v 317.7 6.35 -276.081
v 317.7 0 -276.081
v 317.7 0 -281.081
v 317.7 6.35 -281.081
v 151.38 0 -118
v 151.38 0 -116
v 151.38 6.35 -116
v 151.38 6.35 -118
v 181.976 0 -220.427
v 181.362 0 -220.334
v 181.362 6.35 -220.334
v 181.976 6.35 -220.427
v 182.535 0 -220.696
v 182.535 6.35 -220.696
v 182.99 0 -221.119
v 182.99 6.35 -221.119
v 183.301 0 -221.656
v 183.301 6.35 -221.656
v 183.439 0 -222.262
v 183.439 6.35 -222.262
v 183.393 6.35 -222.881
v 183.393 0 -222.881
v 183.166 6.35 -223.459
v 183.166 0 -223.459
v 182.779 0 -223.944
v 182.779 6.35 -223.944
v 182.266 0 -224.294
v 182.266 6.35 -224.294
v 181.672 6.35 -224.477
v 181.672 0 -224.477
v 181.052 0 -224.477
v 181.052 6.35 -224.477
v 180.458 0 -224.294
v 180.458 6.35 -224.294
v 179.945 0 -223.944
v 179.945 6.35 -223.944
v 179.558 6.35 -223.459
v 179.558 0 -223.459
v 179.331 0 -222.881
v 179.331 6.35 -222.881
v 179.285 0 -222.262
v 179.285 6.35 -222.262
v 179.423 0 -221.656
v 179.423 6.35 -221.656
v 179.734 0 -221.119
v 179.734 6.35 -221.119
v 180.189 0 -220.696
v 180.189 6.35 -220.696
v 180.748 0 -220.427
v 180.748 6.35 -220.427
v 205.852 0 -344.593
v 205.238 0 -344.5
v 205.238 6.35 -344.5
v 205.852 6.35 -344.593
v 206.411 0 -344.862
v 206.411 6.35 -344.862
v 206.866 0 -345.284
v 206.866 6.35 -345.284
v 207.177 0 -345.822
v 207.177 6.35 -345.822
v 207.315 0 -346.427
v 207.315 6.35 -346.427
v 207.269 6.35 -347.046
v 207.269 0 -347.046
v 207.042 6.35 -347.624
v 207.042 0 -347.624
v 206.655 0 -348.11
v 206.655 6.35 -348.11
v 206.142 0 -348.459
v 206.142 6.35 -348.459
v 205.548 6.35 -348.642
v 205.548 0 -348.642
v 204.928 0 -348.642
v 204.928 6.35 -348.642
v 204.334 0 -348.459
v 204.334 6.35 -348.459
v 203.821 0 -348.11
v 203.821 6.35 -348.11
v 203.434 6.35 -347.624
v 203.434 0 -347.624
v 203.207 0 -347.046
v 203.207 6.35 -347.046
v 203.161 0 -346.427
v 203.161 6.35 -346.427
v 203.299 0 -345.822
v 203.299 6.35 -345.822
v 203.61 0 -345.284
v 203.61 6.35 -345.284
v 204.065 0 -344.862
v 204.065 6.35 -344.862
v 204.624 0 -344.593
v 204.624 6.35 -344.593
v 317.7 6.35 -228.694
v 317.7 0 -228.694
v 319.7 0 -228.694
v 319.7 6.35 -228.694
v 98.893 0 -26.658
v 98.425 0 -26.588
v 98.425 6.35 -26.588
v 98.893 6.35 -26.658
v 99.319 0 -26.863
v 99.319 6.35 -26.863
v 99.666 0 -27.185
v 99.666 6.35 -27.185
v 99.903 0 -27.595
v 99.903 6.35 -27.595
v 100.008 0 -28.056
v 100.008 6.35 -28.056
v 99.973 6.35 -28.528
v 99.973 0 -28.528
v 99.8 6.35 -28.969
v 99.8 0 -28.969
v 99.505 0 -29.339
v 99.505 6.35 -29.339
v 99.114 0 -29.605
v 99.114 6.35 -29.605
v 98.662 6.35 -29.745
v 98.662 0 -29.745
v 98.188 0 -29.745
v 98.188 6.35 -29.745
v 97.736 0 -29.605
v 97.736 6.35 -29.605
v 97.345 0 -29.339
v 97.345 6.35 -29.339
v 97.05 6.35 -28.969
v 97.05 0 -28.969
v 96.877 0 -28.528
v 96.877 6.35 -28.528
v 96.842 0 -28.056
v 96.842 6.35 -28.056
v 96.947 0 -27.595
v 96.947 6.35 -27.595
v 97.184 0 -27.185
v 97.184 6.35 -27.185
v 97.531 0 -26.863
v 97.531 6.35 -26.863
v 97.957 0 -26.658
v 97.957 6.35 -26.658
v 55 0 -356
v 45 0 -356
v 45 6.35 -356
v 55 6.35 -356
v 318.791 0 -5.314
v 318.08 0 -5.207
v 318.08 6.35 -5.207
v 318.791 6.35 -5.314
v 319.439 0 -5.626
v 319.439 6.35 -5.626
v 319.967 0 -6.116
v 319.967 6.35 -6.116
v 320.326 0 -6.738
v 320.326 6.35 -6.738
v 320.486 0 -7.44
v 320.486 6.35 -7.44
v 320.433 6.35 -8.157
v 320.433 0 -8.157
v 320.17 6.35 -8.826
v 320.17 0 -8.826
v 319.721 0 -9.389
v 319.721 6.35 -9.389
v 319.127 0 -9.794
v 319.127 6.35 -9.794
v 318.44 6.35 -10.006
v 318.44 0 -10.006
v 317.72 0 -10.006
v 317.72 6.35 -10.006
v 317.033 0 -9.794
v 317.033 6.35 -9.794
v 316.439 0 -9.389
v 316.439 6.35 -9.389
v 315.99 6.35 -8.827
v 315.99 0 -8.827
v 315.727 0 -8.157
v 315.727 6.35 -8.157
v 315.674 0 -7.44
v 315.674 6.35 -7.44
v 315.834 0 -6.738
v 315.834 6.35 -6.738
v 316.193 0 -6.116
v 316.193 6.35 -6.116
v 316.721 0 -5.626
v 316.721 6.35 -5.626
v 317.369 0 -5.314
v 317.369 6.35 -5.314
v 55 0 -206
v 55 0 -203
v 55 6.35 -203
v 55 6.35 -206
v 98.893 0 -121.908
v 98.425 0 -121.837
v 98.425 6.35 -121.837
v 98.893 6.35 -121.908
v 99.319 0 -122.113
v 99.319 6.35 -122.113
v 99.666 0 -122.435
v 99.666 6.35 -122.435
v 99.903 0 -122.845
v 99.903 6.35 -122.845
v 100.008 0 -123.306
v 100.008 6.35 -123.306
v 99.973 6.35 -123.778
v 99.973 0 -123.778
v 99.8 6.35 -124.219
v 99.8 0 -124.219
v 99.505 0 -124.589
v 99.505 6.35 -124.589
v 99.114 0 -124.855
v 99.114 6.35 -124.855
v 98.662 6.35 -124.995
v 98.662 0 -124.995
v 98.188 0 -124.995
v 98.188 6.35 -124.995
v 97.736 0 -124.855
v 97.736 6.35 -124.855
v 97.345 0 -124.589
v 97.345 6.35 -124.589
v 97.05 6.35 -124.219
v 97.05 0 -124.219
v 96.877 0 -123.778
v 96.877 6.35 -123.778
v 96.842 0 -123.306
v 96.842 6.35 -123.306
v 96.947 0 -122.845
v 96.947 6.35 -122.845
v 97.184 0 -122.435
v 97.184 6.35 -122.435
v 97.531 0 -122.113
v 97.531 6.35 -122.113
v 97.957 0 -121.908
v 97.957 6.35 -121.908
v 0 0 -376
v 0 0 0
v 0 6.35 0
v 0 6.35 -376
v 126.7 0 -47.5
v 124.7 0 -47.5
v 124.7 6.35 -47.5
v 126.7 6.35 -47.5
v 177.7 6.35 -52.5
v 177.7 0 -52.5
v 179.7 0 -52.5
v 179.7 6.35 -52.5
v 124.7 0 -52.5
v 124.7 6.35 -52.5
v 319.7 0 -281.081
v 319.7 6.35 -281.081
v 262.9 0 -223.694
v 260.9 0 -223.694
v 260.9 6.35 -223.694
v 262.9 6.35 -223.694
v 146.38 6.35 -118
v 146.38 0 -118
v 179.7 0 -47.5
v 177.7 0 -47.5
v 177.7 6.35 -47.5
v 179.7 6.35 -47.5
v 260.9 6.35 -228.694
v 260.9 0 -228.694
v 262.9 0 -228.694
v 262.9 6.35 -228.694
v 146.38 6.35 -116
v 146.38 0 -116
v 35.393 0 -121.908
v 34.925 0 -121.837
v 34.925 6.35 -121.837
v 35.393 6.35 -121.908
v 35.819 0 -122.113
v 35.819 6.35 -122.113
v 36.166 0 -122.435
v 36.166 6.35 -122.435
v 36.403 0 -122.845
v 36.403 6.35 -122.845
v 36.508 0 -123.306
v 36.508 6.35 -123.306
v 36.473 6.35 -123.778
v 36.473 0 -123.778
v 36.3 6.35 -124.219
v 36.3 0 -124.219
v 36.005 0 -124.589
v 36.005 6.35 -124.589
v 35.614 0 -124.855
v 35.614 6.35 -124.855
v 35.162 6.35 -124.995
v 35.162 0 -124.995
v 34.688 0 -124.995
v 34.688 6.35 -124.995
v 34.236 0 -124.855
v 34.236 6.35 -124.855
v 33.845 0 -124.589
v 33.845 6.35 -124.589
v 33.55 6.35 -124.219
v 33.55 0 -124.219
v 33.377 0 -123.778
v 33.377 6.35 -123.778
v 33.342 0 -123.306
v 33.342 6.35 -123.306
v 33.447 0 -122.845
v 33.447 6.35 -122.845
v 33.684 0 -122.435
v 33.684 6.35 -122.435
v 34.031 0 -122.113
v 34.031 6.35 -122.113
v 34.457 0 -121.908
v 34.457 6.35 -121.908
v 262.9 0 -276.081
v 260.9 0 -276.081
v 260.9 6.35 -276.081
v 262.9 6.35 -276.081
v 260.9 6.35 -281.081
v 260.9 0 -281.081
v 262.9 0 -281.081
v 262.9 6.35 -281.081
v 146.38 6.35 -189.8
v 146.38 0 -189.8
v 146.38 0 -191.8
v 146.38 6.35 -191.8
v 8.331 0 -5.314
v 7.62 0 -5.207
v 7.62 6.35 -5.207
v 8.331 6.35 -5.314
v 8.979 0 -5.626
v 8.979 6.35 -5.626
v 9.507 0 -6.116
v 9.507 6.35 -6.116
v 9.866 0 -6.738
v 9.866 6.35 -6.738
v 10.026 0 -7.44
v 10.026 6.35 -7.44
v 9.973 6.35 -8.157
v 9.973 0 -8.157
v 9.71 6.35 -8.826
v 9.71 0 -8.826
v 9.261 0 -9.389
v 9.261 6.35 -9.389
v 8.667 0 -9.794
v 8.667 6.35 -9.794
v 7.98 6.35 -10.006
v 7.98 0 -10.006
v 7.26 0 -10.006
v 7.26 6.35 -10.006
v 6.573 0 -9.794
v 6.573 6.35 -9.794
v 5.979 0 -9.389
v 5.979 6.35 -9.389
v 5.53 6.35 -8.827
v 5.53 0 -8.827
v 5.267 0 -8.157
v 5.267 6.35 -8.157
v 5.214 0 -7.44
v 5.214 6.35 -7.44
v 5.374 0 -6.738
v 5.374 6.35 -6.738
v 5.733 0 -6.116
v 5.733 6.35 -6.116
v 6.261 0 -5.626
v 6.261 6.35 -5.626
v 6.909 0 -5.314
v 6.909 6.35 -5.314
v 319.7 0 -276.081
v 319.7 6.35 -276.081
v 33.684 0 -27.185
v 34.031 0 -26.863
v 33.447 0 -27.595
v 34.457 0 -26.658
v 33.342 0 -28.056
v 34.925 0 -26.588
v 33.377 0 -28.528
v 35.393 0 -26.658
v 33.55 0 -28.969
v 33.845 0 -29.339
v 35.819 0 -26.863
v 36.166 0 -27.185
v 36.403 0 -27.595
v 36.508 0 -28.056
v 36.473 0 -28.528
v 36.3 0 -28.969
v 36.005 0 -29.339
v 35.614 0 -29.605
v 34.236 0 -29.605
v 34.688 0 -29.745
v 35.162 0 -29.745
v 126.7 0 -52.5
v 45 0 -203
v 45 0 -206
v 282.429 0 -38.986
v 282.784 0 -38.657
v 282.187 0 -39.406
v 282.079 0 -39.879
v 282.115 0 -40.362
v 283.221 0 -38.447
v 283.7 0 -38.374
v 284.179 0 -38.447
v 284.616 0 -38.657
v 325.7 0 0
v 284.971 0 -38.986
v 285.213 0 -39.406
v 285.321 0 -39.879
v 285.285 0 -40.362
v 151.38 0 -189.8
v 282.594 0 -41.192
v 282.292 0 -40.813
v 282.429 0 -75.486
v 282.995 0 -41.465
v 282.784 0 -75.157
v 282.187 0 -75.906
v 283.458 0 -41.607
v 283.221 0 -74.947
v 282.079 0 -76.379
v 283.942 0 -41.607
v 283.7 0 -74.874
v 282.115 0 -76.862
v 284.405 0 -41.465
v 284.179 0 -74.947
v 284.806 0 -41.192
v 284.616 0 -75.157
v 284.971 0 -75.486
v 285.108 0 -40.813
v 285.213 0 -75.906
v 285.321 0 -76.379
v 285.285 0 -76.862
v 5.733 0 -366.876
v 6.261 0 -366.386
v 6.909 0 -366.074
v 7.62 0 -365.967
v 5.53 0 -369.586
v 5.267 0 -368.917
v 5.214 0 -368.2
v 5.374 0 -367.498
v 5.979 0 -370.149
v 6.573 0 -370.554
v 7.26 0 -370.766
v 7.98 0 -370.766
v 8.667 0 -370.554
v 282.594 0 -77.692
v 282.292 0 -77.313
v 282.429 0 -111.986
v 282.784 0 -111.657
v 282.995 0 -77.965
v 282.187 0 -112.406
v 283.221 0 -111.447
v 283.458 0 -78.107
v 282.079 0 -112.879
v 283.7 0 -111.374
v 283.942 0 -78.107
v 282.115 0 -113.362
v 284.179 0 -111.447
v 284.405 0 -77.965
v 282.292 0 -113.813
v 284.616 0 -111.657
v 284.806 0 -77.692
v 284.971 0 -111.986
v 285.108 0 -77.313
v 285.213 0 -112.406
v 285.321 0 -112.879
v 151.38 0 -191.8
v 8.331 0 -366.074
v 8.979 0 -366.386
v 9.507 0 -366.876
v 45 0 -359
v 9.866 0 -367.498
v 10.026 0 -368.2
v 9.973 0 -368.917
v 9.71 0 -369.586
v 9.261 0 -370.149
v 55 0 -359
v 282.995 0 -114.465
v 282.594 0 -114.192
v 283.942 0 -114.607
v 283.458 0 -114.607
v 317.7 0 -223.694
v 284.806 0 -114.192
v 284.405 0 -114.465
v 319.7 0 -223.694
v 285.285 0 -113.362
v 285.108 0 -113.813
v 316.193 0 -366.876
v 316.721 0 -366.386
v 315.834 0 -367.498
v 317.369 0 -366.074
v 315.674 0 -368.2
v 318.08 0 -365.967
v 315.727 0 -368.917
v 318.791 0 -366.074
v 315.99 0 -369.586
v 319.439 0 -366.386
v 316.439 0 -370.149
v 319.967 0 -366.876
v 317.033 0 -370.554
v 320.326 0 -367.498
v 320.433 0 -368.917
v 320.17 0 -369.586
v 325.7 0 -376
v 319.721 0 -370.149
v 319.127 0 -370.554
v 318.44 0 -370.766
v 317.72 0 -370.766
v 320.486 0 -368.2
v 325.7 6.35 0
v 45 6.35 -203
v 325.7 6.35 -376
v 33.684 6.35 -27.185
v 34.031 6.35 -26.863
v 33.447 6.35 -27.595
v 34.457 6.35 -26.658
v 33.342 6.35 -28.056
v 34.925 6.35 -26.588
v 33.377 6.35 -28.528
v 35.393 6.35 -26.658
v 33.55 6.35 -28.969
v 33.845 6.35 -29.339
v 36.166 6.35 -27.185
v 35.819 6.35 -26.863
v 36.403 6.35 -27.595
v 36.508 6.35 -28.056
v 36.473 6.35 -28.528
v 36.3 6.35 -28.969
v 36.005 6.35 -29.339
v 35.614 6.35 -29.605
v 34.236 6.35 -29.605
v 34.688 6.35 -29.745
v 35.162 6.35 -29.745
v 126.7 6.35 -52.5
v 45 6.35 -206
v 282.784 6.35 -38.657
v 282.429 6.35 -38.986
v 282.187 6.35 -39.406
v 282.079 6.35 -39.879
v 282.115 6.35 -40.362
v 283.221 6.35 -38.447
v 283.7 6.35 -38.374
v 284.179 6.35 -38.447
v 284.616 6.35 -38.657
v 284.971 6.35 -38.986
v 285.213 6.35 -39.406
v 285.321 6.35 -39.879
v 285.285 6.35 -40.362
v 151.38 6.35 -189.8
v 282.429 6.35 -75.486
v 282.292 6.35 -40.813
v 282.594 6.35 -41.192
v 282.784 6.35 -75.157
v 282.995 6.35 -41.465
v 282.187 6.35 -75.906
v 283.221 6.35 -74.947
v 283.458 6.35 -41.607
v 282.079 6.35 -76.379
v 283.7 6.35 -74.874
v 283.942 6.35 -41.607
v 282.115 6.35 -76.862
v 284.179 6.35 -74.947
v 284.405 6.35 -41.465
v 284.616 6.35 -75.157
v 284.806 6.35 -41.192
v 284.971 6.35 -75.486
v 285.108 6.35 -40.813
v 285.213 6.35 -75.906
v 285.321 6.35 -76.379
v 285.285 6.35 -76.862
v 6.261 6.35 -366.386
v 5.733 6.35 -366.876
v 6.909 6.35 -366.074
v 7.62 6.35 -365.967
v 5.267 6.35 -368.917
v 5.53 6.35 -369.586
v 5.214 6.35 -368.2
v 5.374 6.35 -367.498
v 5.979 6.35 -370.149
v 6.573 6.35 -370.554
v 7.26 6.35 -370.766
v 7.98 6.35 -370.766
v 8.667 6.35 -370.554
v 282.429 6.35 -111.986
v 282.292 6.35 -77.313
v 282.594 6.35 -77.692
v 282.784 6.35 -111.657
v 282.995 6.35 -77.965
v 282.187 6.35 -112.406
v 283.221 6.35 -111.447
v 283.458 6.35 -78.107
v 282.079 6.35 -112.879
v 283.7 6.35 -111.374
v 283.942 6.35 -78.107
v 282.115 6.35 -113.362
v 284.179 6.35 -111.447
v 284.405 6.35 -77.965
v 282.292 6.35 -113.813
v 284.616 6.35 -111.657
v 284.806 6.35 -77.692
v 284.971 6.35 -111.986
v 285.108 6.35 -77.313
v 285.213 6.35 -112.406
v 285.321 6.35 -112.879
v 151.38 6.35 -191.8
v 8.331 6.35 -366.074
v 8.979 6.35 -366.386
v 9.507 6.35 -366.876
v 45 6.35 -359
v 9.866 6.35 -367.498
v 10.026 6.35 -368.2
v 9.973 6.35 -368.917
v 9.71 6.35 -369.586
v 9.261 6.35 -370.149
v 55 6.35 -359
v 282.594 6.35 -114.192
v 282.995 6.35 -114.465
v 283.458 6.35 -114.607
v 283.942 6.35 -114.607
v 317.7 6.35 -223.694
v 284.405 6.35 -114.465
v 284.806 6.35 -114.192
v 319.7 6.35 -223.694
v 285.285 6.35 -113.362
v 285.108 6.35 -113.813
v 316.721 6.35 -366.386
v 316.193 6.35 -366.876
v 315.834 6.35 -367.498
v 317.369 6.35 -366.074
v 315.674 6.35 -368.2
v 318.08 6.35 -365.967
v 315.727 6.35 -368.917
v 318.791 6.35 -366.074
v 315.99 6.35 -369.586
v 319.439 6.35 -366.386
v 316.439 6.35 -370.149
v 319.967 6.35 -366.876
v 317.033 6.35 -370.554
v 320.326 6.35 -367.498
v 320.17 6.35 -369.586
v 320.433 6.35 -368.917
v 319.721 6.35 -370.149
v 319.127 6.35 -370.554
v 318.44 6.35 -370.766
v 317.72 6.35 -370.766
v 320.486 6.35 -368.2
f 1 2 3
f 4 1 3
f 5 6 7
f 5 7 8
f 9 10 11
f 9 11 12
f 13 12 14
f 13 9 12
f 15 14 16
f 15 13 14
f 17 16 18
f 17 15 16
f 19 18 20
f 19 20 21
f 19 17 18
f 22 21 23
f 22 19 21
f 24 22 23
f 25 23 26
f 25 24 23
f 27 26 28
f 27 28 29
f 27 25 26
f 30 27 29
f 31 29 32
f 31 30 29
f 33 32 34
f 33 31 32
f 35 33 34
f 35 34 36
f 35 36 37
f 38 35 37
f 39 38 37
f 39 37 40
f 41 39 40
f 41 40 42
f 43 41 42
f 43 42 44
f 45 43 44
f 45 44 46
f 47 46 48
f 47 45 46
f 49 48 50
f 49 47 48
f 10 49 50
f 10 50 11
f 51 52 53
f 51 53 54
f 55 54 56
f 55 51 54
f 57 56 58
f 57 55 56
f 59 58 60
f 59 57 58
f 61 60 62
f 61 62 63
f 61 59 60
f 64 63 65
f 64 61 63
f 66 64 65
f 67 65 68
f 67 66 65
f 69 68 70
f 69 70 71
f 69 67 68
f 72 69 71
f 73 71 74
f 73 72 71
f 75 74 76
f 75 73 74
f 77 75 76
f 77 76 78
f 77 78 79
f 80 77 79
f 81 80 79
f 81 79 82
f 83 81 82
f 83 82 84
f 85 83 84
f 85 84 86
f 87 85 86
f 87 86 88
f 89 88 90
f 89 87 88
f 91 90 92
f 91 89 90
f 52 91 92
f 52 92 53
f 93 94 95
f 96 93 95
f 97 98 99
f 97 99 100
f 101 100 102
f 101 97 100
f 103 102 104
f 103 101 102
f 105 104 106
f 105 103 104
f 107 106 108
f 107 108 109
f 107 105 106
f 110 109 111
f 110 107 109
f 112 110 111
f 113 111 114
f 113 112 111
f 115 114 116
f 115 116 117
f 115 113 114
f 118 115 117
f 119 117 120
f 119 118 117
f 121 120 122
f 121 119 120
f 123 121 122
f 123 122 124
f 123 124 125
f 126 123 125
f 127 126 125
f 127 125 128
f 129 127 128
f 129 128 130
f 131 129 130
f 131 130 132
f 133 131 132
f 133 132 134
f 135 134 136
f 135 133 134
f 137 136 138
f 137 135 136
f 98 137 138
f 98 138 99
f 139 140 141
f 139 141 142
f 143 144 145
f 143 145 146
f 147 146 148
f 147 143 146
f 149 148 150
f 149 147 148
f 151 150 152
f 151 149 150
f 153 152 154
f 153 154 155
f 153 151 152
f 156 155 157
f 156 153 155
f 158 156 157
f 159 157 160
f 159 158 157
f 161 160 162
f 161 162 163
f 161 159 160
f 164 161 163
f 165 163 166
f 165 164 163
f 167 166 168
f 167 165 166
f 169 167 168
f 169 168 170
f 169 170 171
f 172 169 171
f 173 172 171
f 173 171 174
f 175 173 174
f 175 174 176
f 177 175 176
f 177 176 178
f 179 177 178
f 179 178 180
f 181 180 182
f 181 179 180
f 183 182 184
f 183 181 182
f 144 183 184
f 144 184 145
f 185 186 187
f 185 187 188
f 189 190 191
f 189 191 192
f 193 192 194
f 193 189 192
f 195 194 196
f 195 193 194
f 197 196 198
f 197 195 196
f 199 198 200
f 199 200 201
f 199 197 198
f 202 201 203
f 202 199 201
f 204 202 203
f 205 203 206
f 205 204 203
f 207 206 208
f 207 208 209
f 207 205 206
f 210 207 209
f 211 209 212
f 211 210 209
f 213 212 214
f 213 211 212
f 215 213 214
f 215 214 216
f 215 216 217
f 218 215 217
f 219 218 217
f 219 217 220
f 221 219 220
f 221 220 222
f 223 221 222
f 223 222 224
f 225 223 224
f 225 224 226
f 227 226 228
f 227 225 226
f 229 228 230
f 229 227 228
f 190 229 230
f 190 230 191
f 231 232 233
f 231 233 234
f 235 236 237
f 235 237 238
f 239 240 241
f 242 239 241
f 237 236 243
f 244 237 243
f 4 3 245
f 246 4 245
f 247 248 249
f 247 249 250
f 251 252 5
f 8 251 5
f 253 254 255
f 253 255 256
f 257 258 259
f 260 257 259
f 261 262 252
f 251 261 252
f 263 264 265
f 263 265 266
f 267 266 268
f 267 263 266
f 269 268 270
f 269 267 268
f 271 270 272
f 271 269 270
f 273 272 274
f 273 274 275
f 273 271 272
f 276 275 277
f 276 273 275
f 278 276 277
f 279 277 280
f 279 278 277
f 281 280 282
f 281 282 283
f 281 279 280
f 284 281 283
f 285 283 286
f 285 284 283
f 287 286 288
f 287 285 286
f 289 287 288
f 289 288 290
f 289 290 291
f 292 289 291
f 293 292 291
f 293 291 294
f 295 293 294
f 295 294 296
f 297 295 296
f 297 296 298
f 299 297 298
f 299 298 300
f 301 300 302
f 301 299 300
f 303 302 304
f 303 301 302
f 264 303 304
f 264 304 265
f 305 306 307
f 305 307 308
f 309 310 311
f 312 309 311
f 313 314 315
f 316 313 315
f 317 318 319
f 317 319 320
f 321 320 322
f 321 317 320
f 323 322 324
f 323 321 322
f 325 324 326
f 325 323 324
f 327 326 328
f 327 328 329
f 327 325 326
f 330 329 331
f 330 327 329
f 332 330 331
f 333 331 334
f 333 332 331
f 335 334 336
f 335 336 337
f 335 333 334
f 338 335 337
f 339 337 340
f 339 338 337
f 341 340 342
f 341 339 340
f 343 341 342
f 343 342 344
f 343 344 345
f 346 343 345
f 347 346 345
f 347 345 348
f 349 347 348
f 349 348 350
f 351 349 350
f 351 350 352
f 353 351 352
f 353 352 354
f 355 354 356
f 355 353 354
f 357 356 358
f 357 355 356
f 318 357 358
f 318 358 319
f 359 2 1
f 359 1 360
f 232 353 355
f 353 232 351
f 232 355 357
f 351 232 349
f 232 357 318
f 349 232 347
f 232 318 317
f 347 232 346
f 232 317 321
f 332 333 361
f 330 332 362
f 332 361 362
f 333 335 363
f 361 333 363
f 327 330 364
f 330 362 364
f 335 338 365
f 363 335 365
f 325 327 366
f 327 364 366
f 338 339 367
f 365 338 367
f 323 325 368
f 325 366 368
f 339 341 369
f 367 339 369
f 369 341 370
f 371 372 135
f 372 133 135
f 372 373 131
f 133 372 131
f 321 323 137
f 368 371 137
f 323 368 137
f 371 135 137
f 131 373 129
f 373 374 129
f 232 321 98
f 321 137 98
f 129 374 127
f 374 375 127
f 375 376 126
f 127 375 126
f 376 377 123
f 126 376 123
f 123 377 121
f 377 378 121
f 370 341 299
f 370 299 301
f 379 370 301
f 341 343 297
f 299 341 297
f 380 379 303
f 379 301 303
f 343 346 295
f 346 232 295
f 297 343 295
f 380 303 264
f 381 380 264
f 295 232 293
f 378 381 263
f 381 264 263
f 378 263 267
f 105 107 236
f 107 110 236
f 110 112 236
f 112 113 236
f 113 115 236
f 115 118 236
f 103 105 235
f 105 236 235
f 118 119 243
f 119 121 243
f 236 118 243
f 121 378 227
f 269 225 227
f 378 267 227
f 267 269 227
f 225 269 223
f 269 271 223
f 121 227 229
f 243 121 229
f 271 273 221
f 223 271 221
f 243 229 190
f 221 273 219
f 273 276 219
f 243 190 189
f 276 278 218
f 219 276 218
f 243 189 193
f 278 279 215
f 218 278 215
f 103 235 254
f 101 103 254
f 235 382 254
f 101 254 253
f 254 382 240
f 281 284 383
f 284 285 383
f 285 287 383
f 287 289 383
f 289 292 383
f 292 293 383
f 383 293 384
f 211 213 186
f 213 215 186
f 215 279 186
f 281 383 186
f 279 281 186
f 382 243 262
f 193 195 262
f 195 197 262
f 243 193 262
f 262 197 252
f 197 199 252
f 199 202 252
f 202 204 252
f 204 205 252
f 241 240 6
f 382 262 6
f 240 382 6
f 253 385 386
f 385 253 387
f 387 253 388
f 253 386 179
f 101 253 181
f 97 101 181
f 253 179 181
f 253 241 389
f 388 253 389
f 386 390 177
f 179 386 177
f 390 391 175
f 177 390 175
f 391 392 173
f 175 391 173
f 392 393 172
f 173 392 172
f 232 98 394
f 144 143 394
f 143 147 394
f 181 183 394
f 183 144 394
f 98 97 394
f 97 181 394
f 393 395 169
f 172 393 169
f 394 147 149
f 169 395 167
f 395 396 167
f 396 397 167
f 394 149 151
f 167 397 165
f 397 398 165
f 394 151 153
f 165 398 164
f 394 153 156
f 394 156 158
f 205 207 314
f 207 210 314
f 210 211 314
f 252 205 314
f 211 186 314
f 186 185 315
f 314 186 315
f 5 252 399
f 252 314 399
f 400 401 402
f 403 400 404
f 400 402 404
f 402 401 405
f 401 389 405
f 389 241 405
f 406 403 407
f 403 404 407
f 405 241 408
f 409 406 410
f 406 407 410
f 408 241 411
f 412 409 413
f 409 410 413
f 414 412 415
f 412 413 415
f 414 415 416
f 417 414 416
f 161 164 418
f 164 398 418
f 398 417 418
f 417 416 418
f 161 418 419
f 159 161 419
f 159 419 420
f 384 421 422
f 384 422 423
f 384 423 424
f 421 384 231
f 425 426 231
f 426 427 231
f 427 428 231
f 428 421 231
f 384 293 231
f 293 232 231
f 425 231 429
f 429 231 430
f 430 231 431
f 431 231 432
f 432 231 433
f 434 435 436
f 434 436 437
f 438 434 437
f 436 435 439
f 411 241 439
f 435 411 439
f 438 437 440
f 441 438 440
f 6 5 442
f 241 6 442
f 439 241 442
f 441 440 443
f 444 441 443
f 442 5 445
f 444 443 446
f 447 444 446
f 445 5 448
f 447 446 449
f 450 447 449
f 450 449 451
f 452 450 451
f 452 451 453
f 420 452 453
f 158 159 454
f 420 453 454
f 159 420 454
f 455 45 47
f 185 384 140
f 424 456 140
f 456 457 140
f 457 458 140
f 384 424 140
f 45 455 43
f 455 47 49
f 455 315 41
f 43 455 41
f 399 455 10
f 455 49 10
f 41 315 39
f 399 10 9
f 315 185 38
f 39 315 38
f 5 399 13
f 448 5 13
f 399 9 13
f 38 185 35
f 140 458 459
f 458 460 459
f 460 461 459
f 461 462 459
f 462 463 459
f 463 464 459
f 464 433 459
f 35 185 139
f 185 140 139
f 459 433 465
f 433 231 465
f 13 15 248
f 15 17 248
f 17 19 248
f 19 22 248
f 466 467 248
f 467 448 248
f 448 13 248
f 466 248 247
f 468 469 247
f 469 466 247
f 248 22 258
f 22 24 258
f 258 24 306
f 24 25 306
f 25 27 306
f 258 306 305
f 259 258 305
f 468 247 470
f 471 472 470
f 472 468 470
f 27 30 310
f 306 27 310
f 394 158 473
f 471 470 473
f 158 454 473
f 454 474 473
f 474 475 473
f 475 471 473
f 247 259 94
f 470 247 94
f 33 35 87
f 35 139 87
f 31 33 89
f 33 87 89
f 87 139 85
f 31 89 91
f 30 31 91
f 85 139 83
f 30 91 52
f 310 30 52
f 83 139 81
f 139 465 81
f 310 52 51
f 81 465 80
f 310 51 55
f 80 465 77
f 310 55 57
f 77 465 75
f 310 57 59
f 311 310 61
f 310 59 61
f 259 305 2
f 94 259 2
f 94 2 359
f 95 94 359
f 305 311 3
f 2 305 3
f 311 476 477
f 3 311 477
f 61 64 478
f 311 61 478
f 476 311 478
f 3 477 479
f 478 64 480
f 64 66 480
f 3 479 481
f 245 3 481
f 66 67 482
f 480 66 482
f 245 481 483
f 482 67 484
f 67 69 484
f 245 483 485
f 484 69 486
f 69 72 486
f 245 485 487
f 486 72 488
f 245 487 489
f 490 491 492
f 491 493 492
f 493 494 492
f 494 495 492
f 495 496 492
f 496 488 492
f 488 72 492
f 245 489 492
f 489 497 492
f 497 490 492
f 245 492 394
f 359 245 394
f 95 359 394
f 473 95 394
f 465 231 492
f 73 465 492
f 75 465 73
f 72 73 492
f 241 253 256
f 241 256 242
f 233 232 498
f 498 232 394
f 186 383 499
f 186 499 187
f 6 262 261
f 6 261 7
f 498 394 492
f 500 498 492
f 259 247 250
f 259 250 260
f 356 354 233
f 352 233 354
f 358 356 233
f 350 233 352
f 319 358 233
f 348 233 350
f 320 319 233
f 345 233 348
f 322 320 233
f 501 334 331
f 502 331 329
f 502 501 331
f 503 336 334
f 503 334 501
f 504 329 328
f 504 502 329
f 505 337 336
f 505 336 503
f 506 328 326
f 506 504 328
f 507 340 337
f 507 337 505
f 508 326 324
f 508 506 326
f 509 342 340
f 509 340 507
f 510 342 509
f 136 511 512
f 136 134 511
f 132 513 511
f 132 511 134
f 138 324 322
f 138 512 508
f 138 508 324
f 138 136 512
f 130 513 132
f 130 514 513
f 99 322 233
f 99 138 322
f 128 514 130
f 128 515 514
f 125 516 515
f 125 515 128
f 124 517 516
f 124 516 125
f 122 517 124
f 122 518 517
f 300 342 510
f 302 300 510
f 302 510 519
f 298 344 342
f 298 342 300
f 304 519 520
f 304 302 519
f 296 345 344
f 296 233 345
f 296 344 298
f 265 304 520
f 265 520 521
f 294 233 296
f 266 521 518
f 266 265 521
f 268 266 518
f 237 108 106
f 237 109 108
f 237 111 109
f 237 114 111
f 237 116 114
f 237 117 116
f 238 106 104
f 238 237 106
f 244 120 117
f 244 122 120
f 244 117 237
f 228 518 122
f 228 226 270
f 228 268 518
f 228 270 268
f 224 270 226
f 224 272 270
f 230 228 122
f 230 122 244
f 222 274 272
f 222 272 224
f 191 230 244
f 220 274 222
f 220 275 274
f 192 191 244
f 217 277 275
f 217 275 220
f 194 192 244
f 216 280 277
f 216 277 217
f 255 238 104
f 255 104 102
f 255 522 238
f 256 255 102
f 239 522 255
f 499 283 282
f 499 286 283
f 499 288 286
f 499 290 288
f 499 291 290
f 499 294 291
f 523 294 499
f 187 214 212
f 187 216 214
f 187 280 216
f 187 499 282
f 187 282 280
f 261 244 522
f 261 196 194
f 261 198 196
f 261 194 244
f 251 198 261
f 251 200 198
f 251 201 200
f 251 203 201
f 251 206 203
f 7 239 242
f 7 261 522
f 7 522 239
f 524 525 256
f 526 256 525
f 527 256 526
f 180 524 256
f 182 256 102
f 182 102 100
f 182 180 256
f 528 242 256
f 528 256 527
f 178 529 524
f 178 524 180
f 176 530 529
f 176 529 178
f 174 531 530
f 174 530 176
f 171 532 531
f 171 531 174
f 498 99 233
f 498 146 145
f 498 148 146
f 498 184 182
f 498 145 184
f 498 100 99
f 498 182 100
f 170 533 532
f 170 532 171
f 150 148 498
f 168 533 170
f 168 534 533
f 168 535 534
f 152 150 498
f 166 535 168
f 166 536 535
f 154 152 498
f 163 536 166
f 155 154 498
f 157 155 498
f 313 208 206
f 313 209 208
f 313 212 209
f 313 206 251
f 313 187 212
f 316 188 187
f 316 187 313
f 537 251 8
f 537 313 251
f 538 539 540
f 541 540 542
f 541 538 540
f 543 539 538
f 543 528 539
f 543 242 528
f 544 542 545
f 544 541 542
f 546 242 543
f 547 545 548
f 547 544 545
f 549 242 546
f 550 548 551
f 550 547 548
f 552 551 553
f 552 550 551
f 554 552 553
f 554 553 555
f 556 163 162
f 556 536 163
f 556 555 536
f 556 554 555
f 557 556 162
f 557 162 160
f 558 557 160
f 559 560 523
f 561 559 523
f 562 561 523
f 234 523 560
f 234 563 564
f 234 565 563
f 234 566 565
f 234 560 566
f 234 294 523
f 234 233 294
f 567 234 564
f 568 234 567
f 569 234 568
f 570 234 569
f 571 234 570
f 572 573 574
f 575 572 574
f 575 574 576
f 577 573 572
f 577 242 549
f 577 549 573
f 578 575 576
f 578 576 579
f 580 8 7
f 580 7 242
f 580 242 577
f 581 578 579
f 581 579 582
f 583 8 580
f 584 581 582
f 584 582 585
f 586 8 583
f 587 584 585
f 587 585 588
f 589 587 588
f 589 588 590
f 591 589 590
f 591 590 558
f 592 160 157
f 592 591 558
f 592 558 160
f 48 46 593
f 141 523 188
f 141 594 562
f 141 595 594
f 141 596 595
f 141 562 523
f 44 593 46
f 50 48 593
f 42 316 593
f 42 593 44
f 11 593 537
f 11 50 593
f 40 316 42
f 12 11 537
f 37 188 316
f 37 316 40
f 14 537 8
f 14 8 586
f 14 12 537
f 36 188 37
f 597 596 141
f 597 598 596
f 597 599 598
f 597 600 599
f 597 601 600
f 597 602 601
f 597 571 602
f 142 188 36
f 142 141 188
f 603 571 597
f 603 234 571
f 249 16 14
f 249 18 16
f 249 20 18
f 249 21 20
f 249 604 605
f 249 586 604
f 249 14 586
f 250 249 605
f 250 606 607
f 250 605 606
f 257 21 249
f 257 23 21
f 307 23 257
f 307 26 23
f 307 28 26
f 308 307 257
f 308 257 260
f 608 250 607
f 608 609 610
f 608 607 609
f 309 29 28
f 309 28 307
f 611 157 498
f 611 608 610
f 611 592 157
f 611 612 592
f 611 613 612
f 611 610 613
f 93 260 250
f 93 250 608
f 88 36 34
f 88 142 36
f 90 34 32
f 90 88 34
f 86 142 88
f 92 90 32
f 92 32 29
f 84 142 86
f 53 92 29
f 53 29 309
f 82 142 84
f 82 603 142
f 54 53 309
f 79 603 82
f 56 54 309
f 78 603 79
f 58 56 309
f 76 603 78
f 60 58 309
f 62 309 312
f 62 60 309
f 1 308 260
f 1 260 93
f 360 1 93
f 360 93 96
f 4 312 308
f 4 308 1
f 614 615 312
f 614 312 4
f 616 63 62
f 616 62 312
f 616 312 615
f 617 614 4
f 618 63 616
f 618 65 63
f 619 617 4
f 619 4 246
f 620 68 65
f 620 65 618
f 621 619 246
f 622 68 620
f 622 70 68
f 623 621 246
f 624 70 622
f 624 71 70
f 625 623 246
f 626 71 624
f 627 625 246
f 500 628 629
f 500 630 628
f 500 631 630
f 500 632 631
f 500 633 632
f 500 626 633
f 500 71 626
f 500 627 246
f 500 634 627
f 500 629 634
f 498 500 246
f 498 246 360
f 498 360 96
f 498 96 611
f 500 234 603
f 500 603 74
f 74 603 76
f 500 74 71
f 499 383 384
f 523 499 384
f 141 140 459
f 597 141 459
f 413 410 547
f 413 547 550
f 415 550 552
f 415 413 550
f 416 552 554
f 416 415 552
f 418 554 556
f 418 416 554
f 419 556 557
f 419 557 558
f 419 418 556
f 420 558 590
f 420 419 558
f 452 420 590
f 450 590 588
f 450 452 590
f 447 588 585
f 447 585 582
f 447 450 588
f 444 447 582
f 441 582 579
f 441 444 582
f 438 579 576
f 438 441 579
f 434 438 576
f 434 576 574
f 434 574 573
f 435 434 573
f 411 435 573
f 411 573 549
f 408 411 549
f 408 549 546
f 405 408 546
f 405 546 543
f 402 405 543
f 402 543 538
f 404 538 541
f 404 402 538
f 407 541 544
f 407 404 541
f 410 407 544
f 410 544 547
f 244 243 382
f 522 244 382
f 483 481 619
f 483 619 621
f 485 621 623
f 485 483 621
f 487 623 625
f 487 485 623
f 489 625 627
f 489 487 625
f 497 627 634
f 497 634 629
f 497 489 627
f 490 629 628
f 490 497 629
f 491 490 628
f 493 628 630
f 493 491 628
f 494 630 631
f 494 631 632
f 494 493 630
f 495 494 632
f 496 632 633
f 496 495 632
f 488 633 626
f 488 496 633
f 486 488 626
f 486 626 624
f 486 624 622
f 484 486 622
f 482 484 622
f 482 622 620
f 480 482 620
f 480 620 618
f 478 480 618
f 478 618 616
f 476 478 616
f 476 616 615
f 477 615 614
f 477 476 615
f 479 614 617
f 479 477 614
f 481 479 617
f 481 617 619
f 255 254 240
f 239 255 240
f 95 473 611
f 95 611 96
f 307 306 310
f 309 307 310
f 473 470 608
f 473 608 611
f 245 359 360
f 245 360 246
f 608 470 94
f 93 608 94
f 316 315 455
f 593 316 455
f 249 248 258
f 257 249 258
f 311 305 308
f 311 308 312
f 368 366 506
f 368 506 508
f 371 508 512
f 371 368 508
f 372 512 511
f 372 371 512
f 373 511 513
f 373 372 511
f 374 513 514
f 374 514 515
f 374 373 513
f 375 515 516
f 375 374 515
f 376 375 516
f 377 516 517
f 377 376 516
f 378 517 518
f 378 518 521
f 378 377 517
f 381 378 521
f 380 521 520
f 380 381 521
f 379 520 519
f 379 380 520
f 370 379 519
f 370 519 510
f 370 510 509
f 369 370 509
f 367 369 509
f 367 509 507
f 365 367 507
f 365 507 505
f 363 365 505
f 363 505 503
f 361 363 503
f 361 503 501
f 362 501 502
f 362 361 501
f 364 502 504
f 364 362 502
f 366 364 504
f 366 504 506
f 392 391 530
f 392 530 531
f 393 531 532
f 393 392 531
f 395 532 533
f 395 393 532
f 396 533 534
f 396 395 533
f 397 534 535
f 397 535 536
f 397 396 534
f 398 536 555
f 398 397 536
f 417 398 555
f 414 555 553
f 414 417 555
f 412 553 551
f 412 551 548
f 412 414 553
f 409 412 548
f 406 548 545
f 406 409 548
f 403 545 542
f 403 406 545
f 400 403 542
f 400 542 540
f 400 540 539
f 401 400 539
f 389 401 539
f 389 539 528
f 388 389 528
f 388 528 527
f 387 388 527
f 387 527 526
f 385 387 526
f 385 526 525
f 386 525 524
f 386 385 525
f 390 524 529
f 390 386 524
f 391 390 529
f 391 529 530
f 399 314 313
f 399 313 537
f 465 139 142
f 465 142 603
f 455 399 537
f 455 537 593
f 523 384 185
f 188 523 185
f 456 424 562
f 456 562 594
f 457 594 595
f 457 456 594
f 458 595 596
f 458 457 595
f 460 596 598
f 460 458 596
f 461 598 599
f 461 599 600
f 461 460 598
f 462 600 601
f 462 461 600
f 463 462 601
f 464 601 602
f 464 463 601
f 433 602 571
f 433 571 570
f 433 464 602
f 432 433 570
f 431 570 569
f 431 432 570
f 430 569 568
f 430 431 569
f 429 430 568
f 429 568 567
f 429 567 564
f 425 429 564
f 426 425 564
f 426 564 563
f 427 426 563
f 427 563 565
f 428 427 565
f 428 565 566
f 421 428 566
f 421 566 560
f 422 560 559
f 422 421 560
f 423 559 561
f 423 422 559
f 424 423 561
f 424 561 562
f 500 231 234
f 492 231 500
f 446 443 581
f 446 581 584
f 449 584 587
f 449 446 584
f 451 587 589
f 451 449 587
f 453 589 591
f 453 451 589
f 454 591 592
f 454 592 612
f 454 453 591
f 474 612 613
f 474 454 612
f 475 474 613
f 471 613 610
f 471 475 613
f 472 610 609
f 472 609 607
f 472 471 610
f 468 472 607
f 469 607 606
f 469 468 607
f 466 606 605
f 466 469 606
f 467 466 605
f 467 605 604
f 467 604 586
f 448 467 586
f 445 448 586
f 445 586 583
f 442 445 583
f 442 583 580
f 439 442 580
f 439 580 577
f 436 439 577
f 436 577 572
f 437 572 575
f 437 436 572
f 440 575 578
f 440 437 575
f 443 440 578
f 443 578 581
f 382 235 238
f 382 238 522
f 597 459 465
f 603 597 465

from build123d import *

# Parameters (mm, degrees)
SKETCH1_W      = 325.7
SKETCH1_H      = 376
SKETCH1_R      = 2.413
SKETCH1_R_2    = 2.0828
SKETCH1_R_3    = 1.5875
SKETCH1_R_4    = 1.6256
SKETCH1_W_2    = 10
SKETCH1_H_2    = 3
SKETCH1_W_3    = 5
SKETCH1_H_3    = 2
SKETCH1_W_4    = 2
SKETCH1_H_4    = 5
EXTRUDE1_DEPTH = 6.35


with BuildPart() as part:
    # Sketch1 → Extrude1 (new body)
    with BuildSketch(Plane(origin=(0, 0, 0), x_dir=(1, 0, 0), z_dir=(0, 1, 0))):
        with Locations((162.85, 188)):
            Rectangle(SKETCH1_W, SKETCH1_H)
        with Locations(Location((7.62, 368.38, 0), (0, 0, 270))):
            Circle(SKETCH1_R, mode=Mode.SUBTRACT)
        with Locations(Location((205.238, 346.5828, 0), (0, 0, 270))):
            Circle(SKETCH1_R_2, mode=Mode.SUBTRACT)
        with Locations(Location((181.362, 222.4172, 0), (0, 0, 270))):
            Circle(SKETCH1_R_2, mode=Mode.SUBTRACT)
        with Locations(Location((318.08, 368.38, 0), (0, 0, 270))):
            Circle(SKETCH1_R, mode=Mode.SUBTRACT)
        with Locations(Location((7.62, 7.62, 0), (0, 0, 270))):
            Circle(SKETCH1_R, mode=Mode.SUBTRACT)
        with Locations(Location((318.08, 7.62, 0), (0, 0, 270))):
            Circle(SKETCH1_R, mode=Mode.SUBTRACT)
        with Locations(Location((34.925, 123.425, 0), (0, 0, 270))):
            Circle(SKETCH1_R_3, mode=Mode.SUBTRACT)
        with Locations(Location((98.425, 123.425, 0), (0, 0, 270))):
            Circle(SKETCH1_R_3, mode=Mode.SUBTRACT)
        with Locations(Location((34.925, 28.175104068, 0), (0, 0, 270))):
            Circle(SKETCH1_R_3, mode=Mode.SUBTRACT)
        with Locations(Location((98.425, 28.175104068, 0), (0, 0, 270))):
            Circle(SKETCH1_R_3, mode=Mode.SUBTRACT)
        with Locations(Location((283.7, 113, 0), (0, 0, 270))):
            Circle(SKETCH1_R_4, mode=Mode.SUBTRACT)
        with Locations(Location((283.7, 40, 0), (0, 0, 270))):
            Circle(SKETCH1_R_4, mode=Mode.SUBTRACT)
        with Locations(Location((283.7, 76.5, 0), (0, 0, 270))):
            Circle(SKETCH1_R_4, mode=Mode.SUBTRACT)
        with Locations((50, 204.5)):
            Rectangle(SKETCH1_W_2, SKETCH1_H_2, mode=Mode.SUBTRACT)
        with Locations((50, 357.5)):
            Rectangle(SKETCH1_W_2, SKETCH1_H_2, mode=Mode.SUBTRACT)
        with Locations((148.88, 190.8)):
            Rectangle(SKETCH1_W_3, SKETCH1_H_3, mode=Mode.SUBTRACT)
        with Locations((148.88, 117)):
            Rectangle(SKETCH1_W_3, SKETCH1_H_3, mode=Mode.SUBTRACT)
        with Locations((125.7, 50)):
            Rectangle(SKETCH1_W_4, SKETCH1_H_4, mode=Mode.SUBTRACT)
        with Locations((178.7, 50)):
            Rectangle(SKETCH1_W_4, SKETCH1_H_4, mode=Mode.SUBTRACT)
        with Locations((318.7, 226.19375)):
            Rectangle(SKETCH1_W_4, SKETCH1_H_4, mode=Mode.SUBTRACT)
        with Locations((261.9, 226.19375)):
            Rectangle(SKETCH1_W_4, SKETCH1_H_4, mode=Mode.SUBTRACT)
        with Locations((318.7, 278.58125)):
            Rectangle(SKETCH1_W_4, SKETCH1_H_4, mode=Mode.SUBTRACT)
        with Locations((261.9, 278.58125)):
            Rectangle(SKETCH1_W_4, SKETCH1_H_4, mode=Mode.SUBTRACT)
    extrude(amount=EXTRUDE1_DEPTH)


solid = part.part
